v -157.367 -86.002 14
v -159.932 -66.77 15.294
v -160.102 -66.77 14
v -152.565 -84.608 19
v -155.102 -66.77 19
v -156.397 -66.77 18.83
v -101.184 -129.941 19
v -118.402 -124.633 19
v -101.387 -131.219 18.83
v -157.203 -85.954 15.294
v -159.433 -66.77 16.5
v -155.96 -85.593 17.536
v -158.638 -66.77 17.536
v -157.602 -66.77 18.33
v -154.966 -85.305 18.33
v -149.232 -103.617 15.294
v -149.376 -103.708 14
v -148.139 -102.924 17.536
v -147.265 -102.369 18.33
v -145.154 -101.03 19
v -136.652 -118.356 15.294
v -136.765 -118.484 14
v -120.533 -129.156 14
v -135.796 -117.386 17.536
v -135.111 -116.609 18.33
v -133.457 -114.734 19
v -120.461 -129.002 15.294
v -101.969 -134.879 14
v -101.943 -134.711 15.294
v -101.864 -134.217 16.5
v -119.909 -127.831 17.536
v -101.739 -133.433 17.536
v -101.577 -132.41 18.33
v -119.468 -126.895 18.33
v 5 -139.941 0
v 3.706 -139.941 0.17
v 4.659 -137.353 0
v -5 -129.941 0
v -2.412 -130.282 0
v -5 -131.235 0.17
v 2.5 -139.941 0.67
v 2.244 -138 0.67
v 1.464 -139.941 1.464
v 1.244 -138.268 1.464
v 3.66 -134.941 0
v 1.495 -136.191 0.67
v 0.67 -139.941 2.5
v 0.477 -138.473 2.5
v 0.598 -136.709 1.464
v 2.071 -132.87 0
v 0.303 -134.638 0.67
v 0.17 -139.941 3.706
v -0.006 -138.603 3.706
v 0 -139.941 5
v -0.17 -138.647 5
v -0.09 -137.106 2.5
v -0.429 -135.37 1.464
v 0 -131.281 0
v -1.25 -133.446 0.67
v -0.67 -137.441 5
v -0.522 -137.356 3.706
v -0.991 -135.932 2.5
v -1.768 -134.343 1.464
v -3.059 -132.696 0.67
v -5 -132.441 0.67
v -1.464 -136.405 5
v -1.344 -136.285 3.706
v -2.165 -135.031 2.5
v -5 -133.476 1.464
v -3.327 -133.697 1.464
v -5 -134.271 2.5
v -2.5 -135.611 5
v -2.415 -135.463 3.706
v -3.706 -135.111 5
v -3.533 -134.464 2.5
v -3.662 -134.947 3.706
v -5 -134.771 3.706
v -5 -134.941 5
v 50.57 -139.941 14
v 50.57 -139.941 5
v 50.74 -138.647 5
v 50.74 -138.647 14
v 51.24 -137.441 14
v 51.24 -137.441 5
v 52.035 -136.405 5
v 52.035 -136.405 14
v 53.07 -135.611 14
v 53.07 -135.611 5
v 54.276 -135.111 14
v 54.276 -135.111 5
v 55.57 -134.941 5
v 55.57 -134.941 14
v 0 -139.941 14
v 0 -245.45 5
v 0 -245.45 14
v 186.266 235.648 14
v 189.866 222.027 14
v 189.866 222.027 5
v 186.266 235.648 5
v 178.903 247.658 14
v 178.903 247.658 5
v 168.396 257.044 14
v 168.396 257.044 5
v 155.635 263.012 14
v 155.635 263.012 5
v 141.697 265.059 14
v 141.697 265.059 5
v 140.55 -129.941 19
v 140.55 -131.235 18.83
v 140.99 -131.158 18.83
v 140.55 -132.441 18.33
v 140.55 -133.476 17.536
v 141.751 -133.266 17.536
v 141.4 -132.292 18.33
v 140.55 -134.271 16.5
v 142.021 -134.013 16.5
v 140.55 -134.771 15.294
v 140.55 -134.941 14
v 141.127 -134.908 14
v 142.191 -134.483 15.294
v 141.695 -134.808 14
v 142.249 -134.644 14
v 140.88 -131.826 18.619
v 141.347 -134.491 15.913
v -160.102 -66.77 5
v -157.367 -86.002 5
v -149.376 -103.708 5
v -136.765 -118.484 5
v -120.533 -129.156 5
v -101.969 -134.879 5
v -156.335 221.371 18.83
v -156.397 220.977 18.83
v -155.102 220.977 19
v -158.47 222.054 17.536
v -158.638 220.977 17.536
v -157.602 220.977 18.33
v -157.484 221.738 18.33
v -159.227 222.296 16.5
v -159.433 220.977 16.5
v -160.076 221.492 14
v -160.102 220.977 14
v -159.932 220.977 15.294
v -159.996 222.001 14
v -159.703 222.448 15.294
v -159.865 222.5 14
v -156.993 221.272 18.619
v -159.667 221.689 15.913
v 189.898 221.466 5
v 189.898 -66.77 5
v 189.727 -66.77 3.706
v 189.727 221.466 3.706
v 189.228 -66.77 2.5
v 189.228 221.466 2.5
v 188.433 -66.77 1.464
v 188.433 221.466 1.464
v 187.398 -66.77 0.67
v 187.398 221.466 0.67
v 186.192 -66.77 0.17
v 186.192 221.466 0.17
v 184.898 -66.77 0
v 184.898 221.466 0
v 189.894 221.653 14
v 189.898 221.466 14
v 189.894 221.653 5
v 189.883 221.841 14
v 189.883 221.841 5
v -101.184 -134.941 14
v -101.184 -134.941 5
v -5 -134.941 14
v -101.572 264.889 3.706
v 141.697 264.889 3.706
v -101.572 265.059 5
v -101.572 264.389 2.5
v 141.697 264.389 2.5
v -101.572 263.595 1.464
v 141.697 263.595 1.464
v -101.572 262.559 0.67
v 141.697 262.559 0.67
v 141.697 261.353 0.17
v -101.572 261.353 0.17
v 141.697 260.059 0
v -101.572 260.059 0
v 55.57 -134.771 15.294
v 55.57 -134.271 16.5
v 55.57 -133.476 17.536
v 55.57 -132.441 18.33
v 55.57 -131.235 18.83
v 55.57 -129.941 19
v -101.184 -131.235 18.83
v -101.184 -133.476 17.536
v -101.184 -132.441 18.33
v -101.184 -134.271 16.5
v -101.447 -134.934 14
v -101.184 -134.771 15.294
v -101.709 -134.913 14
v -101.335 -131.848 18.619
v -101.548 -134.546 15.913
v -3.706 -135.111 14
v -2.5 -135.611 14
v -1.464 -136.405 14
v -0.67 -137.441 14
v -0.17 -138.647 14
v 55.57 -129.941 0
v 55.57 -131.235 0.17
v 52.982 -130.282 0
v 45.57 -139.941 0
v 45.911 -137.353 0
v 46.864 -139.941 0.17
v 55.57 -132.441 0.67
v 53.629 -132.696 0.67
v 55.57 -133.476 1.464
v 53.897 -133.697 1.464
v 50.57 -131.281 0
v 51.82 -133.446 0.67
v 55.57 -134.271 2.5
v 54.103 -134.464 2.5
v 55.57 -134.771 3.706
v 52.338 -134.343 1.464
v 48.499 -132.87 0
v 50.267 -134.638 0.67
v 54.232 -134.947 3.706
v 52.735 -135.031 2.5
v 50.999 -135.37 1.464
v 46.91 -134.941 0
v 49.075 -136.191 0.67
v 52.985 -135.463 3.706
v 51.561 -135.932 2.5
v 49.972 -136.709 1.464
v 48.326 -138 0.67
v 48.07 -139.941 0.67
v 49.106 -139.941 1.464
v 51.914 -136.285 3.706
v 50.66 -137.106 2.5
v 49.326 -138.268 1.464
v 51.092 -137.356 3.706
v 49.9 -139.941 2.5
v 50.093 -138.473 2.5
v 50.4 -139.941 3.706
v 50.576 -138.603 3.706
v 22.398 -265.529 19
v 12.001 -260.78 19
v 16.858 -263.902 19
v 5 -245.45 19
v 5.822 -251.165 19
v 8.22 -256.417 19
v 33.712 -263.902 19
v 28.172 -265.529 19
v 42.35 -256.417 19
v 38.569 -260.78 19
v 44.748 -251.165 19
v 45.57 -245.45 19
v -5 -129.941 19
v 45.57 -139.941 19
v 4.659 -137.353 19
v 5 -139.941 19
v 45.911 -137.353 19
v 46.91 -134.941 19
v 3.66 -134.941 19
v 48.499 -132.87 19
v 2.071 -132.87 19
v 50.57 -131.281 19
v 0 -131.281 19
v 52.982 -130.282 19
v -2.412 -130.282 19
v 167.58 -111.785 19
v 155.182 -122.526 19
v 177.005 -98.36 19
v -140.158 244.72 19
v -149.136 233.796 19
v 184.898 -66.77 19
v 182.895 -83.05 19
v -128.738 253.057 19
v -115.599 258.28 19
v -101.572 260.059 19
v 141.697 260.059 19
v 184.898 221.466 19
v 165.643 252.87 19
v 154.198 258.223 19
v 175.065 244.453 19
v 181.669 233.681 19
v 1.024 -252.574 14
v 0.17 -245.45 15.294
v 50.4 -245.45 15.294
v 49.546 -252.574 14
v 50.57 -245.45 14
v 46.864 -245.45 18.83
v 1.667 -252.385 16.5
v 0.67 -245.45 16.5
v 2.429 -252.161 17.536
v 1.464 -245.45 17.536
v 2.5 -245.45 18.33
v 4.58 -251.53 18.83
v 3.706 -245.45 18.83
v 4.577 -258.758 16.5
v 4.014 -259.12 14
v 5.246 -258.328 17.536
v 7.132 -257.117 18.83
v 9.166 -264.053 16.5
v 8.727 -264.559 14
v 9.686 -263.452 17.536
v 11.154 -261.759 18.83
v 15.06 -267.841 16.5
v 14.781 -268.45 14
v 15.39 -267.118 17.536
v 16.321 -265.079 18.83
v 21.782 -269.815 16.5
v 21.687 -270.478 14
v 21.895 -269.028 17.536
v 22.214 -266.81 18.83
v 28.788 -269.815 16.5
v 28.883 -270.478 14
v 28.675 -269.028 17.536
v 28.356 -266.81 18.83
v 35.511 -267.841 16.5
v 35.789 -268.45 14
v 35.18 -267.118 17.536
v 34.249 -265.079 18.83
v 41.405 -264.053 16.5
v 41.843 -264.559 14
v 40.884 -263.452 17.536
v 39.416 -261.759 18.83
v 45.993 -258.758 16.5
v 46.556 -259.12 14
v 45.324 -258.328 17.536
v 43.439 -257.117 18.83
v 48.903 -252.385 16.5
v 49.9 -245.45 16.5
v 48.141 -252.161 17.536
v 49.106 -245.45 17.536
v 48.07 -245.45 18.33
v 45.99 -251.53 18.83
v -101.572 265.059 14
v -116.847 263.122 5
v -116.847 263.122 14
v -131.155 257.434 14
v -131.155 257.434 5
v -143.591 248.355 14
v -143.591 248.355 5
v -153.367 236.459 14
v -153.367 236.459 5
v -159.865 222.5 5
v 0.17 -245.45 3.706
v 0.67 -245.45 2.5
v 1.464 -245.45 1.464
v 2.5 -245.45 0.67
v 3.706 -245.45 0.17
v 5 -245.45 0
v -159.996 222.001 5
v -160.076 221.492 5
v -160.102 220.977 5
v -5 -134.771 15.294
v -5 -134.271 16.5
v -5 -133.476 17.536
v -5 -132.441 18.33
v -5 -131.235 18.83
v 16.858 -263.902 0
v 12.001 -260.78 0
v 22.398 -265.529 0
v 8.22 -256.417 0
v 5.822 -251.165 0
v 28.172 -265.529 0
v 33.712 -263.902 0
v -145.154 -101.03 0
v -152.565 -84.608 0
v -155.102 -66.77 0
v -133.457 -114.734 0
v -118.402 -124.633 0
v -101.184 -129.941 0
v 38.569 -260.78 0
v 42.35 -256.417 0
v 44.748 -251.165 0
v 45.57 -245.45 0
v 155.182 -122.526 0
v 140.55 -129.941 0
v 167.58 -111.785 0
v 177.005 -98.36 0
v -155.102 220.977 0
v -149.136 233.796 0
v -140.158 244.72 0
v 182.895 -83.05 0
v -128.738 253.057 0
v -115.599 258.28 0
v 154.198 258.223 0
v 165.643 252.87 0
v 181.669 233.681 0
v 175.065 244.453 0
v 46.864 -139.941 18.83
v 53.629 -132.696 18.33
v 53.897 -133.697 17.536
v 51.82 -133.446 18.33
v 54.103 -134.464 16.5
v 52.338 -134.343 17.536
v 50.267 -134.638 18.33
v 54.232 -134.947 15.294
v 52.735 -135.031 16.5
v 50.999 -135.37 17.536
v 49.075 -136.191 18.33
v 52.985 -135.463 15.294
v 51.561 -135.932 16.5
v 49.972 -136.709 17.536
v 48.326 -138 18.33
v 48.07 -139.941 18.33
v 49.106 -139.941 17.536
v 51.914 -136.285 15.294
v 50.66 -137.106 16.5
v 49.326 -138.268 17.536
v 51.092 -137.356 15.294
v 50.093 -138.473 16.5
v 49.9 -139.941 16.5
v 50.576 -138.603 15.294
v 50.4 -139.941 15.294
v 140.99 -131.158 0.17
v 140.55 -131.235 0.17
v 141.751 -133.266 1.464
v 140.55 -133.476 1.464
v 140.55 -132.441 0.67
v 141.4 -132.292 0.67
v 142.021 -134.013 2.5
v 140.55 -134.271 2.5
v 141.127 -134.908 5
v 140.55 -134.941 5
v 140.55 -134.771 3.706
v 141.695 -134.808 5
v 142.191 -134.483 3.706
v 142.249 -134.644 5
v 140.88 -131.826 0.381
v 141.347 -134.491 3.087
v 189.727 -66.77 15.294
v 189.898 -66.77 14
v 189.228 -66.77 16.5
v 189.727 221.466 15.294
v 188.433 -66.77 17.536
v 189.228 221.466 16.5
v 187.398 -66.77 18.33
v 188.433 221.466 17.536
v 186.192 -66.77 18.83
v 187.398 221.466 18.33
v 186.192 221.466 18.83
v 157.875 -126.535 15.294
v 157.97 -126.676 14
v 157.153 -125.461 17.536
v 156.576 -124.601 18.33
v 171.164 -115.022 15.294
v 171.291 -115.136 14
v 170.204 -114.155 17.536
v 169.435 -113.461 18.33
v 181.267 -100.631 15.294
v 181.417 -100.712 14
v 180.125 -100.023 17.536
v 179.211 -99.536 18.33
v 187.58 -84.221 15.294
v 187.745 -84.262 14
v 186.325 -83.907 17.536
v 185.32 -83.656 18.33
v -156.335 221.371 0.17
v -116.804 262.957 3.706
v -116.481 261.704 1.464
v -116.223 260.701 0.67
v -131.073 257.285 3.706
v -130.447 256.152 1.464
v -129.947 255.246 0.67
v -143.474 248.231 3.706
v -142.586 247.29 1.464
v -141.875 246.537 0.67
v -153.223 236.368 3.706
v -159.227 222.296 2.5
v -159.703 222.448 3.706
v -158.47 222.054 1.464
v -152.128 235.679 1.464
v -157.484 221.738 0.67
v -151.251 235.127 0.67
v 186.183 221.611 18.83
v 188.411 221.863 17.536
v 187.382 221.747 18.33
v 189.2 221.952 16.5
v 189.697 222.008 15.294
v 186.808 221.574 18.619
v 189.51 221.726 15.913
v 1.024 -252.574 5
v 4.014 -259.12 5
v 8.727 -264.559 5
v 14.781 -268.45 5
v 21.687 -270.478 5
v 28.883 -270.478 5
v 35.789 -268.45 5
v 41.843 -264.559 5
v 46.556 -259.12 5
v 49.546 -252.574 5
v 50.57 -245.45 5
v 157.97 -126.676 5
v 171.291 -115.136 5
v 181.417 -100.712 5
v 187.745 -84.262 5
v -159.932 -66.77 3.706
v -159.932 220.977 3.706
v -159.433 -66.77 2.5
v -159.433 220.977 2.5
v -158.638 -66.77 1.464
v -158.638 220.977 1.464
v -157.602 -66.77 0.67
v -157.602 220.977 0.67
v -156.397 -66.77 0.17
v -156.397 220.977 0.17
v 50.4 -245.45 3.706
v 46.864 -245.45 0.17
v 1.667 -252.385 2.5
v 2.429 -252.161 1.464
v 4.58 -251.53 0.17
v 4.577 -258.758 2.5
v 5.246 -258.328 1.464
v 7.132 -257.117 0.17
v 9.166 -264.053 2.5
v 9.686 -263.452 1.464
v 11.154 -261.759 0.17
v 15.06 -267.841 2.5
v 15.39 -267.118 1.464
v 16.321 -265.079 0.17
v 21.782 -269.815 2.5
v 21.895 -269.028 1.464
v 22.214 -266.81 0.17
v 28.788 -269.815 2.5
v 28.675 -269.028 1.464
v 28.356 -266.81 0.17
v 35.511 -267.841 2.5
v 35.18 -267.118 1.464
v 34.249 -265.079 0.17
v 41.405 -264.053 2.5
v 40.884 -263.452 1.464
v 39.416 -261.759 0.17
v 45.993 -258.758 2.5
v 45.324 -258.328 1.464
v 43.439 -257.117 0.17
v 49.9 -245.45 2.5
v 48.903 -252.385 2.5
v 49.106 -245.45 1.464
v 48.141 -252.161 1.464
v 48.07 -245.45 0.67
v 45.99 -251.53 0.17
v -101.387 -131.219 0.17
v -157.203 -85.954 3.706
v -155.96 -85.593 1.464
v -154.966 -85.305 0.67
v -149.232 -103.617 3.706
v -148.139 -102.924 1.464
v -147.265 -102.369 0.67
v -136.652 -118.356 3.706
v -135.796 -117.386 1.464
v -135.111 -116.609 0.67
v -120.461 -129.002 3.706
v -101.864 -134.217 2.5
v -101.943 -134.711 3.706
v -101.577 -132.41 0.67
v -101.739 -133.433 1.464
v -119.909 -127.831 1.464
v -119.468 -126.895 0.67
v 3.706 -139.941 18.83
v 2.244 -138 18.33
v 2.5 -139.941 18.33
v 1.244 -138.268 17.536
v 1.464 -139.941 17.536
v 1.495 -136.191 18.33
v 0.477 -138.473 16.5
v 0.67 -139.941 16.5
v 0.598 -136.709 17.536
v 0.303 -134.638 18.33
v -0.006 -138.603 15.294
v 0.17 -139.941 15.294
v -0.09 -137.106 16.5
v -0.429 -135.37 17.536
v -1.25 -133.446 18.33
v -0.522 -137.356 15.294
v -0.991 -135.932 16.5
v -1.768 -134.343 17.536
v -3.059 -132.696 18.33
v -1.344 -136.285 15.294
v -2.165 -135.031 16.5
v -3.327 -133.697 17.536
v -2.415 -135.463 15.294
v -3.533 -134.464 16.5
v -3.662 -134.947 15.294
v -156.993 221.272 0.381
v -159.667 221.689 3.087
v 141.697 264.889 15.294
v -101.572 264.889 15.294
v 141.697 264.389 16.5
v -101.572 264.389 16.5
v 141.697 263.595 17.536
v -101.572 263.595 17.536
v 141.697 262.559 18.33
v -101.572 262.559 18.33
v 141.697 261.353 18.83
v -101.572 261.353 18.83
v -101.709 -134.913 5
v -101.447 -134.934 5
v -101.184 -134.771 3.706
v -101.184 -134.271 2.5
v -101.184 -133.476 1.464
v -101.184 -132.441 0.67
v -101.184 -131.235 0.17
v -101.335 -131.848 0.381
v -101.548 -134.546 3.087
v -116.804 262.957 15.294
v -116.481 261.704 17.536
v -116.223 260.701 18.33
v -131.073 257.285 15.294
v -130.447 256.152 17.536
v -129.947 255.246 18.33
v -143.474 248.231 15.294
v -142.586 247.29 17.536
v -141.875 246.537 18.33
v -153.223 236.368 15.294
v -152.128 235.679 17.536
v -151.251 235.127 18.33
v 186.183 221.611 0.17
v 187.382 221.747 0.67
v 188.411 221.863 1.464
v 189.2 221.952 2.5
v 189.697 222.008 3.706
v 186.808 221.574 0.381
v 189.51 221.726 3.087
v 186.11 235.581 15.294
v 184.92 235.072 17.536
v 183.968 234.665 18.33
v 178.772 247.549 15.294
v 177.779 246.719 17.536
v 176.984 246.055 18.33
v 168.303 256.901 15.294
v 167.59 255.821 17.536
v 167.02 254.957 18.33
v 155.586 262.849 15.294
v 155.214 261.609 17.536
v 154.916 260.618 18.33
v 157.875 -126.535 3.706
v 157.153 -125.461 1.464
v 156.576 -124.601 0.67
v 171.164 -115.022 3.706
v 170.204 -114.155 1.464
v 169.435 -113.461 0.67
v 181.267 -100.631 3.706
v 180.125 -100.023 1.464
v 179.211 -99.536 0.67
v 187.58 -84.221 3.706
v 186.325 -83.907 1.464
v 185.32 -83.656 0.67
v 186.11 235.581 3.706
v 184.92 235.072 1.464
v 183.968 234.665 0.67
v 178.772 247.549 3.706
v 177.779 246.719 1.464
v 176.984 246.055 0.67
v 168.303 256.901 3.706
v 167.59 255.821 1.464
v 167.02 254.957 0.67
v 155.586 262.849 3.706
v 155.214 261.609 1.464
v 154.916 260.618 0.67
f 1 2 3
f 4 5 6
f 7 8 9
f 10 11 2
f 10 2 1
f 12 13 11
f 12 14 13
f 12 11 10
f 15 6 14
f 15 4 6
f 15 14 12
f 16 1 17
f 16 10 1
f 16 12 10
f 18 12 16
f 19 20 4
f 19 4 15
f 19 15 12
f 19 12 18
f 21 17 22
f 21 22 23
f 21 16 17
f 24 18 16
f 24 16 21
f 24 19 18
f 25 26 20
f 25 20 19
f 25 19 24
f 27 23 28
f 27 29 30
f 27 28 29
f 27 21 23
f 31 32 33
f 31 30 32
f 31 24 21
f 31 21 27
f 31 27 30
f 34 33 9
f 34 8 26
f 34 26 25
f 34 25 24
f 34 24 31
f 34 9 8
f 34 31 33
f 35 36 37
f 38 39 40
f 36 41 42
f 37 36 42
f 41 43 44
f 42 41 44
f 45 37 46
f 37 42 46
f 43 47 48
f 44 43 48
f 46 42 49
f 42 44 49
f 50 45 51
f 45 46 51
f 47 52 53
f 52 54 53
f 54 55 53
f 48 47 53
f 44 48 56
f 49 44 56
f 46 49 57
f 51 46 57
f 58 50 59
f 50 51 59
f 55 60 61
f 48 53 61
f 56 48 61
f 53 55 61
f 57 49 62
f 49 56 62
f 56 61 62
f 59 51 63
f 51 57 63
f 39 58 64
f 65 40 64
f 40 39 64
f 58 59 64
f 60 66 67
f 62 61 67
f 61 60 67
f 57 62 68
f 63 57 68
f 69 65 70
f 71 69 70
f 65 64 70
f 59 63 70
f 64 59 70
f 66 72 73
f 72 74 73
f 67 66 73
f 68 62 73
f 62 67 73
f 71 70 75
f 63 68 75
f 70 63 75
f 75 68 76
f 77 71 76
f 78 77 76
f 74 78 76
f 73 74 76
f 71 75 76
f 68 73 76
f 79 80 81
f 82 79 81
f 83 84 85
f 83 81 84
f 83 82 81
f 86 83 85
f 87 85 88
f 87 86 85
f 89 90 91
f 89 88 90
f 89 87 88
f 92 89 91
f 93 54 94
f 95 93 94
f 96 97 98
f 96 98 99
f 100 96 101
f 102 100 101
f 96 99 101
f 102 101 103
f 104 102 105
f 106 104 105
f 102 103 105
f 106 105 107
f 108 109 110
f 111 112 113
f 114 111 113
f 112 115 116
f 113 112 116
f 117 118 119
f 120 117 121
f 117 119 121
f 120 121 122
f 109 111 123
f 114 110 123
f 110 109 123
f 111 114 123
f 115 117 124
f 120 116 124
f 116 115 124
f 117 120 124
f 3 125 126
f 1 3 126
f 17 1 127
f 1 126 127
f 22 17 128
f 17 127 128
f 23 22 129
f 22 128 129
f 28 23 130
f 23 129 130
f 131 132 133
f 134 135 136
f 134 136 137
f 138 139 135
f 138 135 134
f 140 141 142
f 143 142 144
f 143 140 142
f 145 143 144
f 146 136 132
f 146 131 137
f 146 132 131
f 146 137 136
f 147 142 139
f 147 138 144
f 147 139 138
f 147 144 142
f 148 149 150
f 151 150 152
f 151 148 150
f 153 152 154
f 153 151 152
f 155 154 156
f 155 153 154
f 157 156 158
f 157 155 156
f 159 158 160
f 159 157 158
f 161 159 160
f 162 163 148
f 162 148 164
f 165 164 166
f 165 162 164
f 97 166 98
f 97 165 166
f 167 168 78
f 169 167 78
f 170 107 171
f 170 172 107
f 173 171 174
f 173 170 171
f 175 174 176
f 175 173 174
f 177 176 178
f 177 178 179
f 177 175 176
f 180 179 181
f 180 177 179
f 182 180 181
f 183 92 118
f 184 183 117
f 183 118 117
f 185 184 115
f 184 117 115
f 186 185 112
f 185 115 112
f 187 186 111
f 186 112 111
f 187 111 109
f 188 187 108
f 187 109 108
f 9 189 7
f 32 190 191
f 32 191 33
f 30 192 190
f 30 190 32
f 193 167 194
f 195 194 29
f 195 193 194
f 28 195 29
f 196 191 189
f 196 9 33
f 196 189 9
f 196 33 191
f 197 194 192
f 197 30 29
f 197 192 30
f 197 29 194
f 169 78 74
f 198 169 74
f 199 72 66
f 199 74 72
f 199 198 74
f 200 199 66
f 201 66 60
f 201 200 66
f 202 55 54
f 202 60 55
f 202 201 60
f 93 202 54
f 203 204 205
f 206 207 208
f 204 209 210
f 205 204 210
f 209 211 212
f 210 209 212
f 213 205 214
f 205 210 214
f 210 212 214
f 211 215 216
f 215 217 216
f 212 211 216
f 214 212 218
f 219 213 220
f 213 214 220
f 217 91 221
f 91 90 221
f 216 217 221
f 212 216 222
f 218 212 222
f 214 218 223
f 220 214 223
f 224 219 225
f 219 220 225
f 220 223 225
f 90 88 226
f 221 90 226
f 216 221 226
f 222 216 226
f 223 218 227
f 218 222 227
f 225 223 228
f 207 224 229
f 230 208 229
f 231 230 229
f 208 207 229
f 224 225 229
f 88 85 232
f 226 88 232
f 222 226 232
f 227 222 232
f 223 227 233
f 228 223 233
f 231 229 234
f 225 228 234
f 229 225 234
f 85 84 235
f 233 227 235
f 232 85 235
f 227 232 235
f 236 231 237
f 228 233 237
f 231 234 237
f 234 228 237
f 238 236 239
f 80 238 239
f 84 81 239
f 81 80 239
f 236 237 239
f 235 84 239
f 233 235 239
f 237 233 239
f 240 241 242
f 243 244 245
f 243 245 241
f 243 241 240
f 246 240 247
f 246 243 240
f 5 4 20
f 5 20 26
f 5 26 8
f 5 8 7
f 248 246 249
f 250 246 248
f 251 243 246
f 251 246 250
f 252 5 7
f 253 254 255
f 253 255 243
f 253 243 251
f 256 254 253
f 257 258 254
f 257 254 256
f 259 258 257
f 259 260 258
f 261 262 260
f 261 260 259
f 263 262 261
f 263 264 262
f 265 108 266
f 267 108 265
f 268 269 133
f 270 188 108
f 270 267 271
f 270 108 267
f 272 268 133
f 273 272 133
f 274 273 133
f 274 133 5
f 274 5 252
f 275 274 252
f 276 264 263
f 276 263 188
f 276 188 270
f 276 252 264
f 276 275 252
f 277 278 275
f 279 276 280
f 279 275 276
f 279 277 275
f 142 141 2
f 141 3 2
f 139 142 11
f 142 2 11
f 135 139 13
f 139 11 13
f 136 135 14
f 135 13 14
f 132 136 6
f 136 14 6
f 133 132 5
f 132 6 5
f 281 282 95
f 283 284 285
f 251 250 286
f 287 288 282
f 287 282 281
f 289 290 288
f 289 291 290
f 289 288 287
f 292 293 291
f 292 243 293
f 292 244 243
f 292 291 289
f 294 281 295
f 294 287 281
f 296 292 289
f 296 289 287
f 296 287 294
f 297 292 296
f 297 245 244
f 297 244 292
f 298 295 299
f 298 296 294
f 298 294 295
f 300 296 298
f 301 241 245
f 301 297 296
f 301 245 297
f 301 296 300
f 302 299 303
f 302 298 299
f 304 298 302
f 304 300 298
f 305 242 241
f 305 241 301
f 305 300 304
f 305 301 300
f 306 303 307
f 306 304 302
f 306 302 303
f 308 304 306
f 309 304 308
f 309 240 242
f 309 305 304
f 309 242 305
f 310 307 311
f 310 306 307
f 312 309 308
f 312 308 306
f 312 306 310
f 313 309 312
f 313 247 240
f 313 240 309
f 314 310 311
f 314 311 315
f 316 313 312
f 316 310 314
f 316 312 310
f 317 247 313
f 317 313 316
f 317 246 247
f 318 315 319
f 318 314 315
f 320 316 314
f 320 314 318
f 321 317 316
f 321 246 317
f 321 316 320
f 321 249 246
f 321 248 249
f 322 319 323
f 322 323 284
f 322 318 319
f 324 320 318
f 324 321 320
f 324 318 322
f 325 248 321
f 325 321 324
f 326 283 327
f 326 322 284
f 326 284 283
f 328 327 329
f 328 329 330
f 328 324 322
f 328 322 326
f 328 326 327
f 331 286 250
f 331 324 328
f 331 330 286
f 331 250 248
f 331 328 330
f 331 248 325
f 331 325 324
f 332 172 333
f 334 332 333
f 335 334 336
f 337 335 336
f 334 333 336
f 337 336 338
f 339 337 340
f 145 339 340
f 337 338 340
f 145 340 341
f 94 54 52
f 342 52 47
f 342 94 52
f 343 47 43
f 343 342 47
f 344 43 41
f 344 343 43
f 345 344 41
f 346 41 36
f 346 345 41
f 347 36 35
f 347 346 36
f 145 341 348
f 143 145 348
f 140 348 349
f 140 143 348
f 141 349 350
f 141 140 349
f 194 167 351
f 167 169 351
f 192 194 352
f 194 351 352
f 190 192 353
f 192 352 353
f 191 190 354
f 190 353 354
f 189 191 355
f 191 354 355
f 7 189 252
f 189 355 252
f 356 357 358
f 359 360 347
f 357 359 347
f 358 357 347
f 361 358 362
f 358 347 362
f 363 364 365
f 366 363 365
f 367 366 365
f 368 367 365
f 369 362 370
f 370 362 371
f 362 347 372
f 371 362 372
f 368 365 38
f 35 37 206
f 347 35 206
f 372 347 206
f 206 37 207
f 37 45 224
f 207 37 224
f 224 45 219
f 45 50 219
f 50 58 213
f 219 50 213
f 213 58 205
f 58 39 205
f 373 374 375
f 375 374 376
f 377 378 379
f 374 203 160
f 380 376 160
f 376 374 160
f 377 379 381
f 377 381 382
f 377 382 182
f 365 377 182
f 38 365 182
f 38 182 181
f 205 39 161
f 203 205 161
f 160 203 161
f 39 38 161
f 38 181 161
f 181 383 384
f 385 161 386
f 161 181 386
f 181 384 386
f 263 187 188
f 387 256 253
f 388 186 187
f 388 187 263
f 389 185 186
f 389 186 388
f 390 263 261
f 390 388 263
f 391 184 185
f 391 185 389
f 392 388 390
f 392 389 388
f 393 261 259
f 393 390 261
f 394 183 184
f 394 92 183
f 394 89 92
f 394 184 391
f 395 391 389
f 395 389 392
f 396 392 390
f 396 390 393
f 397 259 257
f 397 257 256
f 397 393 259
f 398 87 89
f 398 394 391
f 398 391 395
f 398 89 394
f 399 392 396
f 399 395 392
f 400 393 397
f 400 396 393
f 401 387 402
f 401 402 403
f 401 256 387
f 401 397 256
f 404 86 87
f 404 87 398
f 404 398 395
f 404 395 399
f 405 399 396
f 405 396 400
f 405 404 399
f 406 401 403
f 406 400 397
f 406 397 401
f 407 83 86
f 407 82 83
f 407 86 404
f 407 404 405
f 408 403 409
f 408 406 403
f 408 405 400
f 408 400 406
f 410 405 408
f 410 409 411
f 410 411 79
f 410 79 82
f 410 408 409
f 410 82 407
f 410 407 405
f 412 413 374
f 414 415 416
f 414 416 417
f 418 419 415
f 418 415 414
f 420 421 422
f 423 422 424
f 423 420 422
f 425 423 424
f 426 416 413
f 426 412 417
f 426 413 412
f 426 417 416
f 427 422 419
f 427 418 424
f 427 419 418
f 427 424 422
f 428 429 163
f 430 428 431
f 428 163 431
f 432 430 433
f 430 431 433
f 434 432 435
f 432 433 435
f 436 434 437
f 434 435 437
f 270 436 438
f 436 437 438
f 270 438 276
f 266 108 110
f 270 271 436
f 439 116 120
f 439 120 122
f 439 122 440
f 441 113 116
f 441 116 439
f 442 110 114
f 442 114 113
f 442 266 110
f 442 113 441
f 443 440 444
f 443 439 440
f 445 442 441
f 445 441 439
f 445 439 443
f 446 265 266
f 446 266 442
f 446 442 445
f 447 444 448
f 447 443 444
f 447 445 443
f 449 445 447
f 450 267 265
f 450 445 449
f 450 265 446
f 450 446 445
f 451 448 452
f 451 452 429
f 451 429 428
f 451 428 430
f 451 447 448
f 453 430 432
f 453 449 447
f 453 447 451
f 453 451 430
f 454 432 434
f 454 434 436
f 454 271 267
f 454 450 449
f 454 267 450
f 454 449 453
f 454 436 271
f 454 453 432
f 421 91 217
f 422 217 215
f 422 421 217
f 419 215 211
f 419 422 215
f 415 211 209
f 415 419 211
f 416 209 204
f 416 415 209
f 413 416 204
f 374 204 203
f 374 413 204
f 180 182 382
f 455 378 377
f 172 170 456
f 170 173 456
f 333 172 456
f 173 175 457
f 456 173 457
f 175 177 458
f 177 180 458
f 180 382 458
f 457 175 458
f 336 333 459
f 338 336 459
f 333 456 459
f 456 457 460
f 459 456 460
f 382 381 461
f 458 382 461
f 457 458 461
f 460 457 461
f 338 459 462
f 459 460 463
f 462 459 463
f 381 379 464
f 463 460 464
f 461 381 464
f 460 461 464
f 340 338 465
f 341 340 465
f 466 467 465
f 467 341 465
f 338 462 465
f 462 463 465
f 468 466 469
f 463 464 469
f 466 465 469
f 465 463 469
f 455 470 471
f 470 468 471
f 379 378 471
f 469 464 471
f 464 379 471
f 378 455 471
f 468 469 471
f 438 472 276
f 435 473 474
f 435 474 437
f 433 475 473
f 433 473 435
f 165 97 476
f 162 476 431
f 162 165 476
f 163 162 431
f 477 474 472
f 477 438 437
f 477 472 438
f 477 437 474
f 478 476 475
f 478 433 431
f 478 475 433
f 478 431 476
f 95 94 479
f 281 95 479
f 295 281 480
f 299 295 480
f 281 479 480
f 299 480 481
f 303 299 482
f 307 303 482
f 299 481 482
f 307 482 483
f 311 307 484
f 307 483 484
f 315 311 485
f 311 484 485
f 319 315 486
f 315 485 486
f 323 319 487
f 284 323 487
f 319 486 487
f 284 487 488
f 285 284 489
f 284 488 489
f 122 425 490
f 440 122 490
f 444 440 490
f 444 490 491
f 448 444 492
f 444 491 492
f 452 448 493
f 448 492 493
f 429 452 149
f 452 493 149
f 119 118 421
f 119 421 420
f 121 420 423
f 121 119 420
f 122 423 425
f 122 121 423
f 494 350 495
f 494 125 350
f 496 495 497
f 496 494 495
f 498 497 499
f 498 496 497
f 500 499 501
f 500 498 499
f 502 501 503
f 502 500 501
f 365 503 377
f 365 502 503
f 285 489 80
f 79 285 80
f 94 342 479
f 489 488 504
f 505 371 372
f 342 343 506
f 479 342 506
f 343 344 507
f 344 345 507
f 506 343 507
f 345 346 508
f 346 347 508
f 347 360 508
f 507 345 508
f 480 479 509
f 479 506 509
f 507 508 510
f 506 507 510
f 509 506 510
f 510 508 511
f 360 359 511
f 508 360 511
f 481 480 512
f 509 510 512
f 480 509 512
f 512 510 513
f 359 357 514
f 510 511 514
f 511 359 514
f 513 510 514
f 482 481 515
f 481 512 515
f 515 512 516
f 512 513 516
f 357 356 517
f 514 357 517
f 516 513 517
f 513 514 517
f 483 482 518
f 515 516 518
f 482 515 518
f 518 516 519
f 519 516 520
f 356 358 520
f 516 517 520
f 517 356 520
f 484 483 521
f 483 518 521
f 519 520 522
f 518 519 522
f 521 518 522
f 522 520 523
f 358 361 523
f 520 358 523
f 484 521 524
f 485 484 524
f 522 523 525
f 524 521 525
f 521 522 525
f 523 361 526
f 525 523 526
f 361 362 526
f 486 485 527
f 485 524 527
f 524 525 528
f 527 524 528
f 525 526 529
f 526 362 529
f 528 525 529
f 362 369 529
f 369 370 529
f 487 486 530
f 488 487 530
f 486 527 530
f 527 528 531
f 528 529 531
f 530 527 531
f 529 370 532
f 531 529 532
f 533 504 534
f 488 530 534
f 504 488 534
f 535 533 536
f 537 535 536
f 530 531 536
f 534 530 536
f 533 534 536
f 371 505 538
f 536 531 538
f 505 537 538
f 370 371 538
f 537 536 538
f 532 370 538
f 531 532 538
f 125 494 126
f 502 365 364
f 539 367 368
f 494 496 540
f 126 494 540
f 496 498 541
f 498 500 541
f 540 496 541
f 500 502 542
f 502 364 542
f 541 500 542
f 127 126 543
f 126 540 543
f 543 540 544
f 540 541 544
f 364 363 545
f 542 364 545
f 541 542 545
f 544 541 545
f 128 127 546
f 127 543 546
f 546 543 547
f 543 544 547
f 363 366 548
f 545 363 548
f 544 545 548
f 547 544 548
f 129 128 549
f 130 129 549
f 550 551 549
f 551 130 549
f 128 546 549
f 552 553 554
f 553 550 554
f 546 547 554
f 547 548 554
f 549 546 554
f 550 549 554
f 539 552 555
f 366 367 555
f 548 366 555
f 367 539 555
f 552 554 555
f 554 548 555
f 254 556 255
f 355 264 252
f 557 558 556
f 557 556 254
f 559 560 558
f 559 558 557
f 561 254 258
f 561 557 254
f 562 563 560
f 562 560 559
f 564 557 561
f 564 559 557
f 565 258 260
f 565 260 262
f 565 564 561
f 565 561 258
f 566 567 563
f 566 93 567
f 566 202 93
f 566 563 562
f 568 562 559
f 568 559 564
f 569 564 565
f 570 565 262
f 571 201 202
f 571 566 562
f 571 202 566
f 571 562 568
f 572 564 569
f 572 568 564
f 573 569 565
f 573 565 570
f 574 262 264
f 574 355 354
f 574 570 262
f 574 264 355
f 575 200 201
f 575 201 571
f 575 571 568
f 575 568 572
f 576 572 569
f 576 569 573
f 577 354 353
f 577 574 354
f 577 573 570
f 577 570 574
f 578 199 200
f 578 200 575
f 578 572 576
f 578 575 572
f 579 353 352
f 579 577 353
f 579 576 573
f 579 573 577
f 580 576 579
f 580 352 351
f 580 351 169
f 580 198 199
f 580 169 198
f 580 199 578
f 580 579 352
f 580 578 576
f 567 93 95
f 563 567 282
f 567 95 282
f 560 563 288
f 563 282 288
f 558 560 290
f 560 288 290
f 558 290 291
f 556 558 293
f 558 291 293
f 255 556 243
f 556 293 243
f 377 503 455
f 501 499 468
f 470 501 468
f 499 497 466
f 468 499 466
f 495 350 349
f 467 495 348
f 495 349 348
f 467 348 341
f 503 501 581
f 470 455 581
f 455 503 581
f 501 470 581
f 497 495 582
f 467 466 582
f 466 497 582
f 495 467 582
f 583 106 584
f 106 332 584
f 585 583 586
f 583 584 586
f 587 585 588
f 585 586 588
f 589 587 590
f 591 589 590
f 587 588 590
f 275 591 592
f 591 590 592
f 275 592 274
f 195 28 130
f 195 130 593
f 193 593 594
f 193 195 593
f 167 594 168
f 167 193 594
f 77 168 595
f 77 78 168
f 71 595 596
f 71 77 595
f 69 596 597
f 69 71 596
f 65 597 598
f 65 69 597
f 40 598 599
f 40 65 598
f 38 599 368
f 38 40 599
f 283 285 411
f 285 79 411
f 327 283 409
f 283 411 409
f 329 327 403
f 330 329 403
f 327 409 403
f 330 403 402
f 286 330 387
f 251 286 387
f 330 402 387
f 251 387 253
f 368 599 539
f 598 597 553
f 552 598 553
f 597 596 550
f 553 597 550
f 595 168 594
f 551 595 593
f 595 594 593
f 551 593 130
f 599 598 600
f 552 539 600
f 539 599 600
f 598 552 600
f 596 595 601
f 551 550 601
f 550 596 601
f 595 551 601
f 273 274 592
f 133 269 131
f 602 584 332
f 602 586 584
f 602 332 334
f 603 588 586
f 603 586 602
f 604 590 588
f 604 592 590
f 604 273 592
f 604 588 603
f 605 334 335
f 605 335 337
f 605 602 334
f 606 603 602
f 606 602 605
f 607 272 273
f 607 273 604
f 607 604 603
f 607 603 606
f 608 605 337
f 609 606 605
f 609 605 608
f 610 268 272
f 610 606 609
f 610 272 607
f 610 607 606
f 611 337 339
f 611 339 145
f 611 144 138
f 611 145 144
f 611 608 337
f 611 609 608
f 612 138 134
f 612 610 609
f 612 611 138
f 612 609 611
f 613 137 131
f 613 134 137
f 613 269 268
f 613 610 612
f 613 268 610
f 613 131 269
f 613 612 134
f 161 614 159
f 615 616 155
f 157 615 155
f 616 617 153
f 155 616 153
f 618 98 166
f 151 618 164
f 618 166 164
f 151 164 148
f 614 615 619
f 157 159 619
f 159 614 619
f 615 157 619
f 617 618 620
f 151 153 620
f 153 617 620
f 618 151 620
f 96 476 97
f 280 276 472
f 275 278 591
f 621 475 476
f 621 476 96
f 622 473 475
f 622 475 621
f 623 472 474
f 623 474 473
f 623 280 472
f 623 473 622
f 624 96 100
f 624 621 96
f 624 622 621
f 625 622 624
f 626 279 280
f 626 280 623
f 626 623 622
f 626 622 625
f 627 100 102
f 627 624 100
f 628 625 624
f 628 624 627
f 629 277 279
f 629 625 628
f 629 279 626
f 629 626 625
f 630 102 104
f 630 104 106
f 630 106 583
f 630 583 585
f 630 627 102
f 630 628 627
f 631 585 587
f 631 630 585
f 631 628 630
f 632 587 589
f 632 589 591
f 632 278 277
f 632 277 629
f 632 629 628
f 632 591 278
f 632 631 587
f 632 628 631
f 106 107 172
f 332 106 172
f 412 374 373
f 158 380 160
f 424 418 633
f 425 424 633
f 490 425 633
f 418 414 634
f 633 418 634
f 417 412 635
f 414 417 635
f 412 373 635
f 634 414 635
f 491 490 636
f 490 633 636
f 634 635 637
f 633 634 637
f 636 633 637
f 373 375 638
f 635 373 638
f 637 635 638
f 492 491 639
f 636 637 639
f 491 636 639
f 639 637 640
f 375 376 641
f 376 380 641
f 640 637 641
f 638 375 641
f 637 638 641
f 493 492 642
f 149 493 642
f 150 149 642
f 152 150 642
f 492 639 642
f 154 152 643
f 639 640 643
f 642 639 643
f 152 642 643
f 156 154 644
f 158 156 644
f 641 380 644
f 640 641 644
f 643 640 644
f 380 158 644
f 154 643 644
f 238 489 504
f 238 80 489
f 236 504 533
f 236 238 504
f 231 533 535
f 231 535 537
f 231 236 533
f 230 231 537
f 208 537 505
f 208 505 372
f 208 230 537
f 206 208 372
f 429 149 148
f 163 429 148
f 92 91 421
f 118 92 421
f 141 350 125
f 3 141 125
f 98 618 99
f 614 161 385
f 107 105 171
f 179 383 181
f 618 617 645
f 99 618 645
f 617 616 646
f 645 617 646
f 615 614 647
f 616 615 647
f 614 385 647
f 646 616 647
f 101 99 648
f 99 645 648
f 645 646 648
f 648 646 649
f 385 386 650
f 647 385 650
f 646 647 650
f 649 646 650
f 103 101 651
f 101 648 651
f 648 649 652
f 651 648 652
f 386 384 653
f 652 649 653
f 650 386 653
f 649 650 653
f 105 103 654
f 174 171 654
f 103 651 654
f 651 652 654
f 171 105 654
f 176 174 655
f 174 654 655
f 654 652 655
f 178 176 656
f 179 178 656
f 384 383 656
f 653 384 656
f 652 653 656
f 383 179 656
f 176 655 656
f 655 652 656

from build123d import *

# Parameters (mm, degrees)
F1_DEPTH = 19
F2_R     = 5


with BuildPart() as f1:
    # F0 (on Top) → F1 (new body)
    with BuildSketch(Plane.XY):
        with BuildLine():
            Line((141.696946, 265.05909), (-101.57174, 265.05909))
            ThreePointArc((-101.57174, 265.05909), (-137.980527, 253.051325), (-160.102467, 221.73989))
            Line((-160.102467, 221.73989), (-160.102467, -66.769655))
            ThreePointArc((-160.102467, -66.769655), (-143.462282, -111.695054), (-101.57174, -134.94091))
            Line((-101.57174, -134.94091), (0, -134.94091))
            Line((0, -134.94091), (0, -245.450066))
            ThreePointArc((0, -245.450066), (25.285058, -270.735123), (50.570116, -245.450066))
            Line((50.570116, -245.450066), (50.570116, -134.94091))
            Line((50.570116, -134.94091), (141.409377, -134.94091))
            ThreePointArc((141.409377, -134.94091), (176.539135, -108.597939), (189.897533, -66.769655))
            Line((189.897533, -66.769655), (189.897533, 221.73989))
            ThreePointArc((189.897533, 221.73989), (174.100069, 252.637917), (141.696946, 265.05909))
        make_face()
    extrude(amount=F1_DEPTH)

    # F2
    f2_edges = [f1.edges().sort_by_distance(p)[0] for p in [
        (-160.102467, 221.73989, 9.5),
        (-160.102467, -66.769655, 9.5),
        (-160.102467, 77.485118, 0),
        (-160.102467, 77.485118, 19),
        (-101.57174, -134.94091, 9.5),
        (-143.462282, -111.695054, 0),
        (-143.462282, -111.695054, 19),
        (-50.78587, -134.94091, 19),
        (-50.78587, -134.94091, 0),
        (0, -134.94091, 9.5),
        (0, -245.450066, 9.5),
        (0, -190.195488, 0),
        (0, -190.195488, 19),
        (50.570116, -134.94091, 9.5),
        (141.409377, -134.94091, 9.5),
        (95.989746, -134.94091, 0),
        (95.989746, -134.94091, 19),
        (189.897533, -66.769655, 9.5),
        (176.539135, -108.597939, 0),
        (176.539135, -108.597939, 19),
        (189.897533, 221.73989, 9.5),
        (141.696946, 265.05909, 9.5),
        (174.100069, 252.637917, 0),
        (174.100069, 252.637917, 19),
    ]]
    fillet(f2_edges, radius=F2_R)


solid = f1.part
